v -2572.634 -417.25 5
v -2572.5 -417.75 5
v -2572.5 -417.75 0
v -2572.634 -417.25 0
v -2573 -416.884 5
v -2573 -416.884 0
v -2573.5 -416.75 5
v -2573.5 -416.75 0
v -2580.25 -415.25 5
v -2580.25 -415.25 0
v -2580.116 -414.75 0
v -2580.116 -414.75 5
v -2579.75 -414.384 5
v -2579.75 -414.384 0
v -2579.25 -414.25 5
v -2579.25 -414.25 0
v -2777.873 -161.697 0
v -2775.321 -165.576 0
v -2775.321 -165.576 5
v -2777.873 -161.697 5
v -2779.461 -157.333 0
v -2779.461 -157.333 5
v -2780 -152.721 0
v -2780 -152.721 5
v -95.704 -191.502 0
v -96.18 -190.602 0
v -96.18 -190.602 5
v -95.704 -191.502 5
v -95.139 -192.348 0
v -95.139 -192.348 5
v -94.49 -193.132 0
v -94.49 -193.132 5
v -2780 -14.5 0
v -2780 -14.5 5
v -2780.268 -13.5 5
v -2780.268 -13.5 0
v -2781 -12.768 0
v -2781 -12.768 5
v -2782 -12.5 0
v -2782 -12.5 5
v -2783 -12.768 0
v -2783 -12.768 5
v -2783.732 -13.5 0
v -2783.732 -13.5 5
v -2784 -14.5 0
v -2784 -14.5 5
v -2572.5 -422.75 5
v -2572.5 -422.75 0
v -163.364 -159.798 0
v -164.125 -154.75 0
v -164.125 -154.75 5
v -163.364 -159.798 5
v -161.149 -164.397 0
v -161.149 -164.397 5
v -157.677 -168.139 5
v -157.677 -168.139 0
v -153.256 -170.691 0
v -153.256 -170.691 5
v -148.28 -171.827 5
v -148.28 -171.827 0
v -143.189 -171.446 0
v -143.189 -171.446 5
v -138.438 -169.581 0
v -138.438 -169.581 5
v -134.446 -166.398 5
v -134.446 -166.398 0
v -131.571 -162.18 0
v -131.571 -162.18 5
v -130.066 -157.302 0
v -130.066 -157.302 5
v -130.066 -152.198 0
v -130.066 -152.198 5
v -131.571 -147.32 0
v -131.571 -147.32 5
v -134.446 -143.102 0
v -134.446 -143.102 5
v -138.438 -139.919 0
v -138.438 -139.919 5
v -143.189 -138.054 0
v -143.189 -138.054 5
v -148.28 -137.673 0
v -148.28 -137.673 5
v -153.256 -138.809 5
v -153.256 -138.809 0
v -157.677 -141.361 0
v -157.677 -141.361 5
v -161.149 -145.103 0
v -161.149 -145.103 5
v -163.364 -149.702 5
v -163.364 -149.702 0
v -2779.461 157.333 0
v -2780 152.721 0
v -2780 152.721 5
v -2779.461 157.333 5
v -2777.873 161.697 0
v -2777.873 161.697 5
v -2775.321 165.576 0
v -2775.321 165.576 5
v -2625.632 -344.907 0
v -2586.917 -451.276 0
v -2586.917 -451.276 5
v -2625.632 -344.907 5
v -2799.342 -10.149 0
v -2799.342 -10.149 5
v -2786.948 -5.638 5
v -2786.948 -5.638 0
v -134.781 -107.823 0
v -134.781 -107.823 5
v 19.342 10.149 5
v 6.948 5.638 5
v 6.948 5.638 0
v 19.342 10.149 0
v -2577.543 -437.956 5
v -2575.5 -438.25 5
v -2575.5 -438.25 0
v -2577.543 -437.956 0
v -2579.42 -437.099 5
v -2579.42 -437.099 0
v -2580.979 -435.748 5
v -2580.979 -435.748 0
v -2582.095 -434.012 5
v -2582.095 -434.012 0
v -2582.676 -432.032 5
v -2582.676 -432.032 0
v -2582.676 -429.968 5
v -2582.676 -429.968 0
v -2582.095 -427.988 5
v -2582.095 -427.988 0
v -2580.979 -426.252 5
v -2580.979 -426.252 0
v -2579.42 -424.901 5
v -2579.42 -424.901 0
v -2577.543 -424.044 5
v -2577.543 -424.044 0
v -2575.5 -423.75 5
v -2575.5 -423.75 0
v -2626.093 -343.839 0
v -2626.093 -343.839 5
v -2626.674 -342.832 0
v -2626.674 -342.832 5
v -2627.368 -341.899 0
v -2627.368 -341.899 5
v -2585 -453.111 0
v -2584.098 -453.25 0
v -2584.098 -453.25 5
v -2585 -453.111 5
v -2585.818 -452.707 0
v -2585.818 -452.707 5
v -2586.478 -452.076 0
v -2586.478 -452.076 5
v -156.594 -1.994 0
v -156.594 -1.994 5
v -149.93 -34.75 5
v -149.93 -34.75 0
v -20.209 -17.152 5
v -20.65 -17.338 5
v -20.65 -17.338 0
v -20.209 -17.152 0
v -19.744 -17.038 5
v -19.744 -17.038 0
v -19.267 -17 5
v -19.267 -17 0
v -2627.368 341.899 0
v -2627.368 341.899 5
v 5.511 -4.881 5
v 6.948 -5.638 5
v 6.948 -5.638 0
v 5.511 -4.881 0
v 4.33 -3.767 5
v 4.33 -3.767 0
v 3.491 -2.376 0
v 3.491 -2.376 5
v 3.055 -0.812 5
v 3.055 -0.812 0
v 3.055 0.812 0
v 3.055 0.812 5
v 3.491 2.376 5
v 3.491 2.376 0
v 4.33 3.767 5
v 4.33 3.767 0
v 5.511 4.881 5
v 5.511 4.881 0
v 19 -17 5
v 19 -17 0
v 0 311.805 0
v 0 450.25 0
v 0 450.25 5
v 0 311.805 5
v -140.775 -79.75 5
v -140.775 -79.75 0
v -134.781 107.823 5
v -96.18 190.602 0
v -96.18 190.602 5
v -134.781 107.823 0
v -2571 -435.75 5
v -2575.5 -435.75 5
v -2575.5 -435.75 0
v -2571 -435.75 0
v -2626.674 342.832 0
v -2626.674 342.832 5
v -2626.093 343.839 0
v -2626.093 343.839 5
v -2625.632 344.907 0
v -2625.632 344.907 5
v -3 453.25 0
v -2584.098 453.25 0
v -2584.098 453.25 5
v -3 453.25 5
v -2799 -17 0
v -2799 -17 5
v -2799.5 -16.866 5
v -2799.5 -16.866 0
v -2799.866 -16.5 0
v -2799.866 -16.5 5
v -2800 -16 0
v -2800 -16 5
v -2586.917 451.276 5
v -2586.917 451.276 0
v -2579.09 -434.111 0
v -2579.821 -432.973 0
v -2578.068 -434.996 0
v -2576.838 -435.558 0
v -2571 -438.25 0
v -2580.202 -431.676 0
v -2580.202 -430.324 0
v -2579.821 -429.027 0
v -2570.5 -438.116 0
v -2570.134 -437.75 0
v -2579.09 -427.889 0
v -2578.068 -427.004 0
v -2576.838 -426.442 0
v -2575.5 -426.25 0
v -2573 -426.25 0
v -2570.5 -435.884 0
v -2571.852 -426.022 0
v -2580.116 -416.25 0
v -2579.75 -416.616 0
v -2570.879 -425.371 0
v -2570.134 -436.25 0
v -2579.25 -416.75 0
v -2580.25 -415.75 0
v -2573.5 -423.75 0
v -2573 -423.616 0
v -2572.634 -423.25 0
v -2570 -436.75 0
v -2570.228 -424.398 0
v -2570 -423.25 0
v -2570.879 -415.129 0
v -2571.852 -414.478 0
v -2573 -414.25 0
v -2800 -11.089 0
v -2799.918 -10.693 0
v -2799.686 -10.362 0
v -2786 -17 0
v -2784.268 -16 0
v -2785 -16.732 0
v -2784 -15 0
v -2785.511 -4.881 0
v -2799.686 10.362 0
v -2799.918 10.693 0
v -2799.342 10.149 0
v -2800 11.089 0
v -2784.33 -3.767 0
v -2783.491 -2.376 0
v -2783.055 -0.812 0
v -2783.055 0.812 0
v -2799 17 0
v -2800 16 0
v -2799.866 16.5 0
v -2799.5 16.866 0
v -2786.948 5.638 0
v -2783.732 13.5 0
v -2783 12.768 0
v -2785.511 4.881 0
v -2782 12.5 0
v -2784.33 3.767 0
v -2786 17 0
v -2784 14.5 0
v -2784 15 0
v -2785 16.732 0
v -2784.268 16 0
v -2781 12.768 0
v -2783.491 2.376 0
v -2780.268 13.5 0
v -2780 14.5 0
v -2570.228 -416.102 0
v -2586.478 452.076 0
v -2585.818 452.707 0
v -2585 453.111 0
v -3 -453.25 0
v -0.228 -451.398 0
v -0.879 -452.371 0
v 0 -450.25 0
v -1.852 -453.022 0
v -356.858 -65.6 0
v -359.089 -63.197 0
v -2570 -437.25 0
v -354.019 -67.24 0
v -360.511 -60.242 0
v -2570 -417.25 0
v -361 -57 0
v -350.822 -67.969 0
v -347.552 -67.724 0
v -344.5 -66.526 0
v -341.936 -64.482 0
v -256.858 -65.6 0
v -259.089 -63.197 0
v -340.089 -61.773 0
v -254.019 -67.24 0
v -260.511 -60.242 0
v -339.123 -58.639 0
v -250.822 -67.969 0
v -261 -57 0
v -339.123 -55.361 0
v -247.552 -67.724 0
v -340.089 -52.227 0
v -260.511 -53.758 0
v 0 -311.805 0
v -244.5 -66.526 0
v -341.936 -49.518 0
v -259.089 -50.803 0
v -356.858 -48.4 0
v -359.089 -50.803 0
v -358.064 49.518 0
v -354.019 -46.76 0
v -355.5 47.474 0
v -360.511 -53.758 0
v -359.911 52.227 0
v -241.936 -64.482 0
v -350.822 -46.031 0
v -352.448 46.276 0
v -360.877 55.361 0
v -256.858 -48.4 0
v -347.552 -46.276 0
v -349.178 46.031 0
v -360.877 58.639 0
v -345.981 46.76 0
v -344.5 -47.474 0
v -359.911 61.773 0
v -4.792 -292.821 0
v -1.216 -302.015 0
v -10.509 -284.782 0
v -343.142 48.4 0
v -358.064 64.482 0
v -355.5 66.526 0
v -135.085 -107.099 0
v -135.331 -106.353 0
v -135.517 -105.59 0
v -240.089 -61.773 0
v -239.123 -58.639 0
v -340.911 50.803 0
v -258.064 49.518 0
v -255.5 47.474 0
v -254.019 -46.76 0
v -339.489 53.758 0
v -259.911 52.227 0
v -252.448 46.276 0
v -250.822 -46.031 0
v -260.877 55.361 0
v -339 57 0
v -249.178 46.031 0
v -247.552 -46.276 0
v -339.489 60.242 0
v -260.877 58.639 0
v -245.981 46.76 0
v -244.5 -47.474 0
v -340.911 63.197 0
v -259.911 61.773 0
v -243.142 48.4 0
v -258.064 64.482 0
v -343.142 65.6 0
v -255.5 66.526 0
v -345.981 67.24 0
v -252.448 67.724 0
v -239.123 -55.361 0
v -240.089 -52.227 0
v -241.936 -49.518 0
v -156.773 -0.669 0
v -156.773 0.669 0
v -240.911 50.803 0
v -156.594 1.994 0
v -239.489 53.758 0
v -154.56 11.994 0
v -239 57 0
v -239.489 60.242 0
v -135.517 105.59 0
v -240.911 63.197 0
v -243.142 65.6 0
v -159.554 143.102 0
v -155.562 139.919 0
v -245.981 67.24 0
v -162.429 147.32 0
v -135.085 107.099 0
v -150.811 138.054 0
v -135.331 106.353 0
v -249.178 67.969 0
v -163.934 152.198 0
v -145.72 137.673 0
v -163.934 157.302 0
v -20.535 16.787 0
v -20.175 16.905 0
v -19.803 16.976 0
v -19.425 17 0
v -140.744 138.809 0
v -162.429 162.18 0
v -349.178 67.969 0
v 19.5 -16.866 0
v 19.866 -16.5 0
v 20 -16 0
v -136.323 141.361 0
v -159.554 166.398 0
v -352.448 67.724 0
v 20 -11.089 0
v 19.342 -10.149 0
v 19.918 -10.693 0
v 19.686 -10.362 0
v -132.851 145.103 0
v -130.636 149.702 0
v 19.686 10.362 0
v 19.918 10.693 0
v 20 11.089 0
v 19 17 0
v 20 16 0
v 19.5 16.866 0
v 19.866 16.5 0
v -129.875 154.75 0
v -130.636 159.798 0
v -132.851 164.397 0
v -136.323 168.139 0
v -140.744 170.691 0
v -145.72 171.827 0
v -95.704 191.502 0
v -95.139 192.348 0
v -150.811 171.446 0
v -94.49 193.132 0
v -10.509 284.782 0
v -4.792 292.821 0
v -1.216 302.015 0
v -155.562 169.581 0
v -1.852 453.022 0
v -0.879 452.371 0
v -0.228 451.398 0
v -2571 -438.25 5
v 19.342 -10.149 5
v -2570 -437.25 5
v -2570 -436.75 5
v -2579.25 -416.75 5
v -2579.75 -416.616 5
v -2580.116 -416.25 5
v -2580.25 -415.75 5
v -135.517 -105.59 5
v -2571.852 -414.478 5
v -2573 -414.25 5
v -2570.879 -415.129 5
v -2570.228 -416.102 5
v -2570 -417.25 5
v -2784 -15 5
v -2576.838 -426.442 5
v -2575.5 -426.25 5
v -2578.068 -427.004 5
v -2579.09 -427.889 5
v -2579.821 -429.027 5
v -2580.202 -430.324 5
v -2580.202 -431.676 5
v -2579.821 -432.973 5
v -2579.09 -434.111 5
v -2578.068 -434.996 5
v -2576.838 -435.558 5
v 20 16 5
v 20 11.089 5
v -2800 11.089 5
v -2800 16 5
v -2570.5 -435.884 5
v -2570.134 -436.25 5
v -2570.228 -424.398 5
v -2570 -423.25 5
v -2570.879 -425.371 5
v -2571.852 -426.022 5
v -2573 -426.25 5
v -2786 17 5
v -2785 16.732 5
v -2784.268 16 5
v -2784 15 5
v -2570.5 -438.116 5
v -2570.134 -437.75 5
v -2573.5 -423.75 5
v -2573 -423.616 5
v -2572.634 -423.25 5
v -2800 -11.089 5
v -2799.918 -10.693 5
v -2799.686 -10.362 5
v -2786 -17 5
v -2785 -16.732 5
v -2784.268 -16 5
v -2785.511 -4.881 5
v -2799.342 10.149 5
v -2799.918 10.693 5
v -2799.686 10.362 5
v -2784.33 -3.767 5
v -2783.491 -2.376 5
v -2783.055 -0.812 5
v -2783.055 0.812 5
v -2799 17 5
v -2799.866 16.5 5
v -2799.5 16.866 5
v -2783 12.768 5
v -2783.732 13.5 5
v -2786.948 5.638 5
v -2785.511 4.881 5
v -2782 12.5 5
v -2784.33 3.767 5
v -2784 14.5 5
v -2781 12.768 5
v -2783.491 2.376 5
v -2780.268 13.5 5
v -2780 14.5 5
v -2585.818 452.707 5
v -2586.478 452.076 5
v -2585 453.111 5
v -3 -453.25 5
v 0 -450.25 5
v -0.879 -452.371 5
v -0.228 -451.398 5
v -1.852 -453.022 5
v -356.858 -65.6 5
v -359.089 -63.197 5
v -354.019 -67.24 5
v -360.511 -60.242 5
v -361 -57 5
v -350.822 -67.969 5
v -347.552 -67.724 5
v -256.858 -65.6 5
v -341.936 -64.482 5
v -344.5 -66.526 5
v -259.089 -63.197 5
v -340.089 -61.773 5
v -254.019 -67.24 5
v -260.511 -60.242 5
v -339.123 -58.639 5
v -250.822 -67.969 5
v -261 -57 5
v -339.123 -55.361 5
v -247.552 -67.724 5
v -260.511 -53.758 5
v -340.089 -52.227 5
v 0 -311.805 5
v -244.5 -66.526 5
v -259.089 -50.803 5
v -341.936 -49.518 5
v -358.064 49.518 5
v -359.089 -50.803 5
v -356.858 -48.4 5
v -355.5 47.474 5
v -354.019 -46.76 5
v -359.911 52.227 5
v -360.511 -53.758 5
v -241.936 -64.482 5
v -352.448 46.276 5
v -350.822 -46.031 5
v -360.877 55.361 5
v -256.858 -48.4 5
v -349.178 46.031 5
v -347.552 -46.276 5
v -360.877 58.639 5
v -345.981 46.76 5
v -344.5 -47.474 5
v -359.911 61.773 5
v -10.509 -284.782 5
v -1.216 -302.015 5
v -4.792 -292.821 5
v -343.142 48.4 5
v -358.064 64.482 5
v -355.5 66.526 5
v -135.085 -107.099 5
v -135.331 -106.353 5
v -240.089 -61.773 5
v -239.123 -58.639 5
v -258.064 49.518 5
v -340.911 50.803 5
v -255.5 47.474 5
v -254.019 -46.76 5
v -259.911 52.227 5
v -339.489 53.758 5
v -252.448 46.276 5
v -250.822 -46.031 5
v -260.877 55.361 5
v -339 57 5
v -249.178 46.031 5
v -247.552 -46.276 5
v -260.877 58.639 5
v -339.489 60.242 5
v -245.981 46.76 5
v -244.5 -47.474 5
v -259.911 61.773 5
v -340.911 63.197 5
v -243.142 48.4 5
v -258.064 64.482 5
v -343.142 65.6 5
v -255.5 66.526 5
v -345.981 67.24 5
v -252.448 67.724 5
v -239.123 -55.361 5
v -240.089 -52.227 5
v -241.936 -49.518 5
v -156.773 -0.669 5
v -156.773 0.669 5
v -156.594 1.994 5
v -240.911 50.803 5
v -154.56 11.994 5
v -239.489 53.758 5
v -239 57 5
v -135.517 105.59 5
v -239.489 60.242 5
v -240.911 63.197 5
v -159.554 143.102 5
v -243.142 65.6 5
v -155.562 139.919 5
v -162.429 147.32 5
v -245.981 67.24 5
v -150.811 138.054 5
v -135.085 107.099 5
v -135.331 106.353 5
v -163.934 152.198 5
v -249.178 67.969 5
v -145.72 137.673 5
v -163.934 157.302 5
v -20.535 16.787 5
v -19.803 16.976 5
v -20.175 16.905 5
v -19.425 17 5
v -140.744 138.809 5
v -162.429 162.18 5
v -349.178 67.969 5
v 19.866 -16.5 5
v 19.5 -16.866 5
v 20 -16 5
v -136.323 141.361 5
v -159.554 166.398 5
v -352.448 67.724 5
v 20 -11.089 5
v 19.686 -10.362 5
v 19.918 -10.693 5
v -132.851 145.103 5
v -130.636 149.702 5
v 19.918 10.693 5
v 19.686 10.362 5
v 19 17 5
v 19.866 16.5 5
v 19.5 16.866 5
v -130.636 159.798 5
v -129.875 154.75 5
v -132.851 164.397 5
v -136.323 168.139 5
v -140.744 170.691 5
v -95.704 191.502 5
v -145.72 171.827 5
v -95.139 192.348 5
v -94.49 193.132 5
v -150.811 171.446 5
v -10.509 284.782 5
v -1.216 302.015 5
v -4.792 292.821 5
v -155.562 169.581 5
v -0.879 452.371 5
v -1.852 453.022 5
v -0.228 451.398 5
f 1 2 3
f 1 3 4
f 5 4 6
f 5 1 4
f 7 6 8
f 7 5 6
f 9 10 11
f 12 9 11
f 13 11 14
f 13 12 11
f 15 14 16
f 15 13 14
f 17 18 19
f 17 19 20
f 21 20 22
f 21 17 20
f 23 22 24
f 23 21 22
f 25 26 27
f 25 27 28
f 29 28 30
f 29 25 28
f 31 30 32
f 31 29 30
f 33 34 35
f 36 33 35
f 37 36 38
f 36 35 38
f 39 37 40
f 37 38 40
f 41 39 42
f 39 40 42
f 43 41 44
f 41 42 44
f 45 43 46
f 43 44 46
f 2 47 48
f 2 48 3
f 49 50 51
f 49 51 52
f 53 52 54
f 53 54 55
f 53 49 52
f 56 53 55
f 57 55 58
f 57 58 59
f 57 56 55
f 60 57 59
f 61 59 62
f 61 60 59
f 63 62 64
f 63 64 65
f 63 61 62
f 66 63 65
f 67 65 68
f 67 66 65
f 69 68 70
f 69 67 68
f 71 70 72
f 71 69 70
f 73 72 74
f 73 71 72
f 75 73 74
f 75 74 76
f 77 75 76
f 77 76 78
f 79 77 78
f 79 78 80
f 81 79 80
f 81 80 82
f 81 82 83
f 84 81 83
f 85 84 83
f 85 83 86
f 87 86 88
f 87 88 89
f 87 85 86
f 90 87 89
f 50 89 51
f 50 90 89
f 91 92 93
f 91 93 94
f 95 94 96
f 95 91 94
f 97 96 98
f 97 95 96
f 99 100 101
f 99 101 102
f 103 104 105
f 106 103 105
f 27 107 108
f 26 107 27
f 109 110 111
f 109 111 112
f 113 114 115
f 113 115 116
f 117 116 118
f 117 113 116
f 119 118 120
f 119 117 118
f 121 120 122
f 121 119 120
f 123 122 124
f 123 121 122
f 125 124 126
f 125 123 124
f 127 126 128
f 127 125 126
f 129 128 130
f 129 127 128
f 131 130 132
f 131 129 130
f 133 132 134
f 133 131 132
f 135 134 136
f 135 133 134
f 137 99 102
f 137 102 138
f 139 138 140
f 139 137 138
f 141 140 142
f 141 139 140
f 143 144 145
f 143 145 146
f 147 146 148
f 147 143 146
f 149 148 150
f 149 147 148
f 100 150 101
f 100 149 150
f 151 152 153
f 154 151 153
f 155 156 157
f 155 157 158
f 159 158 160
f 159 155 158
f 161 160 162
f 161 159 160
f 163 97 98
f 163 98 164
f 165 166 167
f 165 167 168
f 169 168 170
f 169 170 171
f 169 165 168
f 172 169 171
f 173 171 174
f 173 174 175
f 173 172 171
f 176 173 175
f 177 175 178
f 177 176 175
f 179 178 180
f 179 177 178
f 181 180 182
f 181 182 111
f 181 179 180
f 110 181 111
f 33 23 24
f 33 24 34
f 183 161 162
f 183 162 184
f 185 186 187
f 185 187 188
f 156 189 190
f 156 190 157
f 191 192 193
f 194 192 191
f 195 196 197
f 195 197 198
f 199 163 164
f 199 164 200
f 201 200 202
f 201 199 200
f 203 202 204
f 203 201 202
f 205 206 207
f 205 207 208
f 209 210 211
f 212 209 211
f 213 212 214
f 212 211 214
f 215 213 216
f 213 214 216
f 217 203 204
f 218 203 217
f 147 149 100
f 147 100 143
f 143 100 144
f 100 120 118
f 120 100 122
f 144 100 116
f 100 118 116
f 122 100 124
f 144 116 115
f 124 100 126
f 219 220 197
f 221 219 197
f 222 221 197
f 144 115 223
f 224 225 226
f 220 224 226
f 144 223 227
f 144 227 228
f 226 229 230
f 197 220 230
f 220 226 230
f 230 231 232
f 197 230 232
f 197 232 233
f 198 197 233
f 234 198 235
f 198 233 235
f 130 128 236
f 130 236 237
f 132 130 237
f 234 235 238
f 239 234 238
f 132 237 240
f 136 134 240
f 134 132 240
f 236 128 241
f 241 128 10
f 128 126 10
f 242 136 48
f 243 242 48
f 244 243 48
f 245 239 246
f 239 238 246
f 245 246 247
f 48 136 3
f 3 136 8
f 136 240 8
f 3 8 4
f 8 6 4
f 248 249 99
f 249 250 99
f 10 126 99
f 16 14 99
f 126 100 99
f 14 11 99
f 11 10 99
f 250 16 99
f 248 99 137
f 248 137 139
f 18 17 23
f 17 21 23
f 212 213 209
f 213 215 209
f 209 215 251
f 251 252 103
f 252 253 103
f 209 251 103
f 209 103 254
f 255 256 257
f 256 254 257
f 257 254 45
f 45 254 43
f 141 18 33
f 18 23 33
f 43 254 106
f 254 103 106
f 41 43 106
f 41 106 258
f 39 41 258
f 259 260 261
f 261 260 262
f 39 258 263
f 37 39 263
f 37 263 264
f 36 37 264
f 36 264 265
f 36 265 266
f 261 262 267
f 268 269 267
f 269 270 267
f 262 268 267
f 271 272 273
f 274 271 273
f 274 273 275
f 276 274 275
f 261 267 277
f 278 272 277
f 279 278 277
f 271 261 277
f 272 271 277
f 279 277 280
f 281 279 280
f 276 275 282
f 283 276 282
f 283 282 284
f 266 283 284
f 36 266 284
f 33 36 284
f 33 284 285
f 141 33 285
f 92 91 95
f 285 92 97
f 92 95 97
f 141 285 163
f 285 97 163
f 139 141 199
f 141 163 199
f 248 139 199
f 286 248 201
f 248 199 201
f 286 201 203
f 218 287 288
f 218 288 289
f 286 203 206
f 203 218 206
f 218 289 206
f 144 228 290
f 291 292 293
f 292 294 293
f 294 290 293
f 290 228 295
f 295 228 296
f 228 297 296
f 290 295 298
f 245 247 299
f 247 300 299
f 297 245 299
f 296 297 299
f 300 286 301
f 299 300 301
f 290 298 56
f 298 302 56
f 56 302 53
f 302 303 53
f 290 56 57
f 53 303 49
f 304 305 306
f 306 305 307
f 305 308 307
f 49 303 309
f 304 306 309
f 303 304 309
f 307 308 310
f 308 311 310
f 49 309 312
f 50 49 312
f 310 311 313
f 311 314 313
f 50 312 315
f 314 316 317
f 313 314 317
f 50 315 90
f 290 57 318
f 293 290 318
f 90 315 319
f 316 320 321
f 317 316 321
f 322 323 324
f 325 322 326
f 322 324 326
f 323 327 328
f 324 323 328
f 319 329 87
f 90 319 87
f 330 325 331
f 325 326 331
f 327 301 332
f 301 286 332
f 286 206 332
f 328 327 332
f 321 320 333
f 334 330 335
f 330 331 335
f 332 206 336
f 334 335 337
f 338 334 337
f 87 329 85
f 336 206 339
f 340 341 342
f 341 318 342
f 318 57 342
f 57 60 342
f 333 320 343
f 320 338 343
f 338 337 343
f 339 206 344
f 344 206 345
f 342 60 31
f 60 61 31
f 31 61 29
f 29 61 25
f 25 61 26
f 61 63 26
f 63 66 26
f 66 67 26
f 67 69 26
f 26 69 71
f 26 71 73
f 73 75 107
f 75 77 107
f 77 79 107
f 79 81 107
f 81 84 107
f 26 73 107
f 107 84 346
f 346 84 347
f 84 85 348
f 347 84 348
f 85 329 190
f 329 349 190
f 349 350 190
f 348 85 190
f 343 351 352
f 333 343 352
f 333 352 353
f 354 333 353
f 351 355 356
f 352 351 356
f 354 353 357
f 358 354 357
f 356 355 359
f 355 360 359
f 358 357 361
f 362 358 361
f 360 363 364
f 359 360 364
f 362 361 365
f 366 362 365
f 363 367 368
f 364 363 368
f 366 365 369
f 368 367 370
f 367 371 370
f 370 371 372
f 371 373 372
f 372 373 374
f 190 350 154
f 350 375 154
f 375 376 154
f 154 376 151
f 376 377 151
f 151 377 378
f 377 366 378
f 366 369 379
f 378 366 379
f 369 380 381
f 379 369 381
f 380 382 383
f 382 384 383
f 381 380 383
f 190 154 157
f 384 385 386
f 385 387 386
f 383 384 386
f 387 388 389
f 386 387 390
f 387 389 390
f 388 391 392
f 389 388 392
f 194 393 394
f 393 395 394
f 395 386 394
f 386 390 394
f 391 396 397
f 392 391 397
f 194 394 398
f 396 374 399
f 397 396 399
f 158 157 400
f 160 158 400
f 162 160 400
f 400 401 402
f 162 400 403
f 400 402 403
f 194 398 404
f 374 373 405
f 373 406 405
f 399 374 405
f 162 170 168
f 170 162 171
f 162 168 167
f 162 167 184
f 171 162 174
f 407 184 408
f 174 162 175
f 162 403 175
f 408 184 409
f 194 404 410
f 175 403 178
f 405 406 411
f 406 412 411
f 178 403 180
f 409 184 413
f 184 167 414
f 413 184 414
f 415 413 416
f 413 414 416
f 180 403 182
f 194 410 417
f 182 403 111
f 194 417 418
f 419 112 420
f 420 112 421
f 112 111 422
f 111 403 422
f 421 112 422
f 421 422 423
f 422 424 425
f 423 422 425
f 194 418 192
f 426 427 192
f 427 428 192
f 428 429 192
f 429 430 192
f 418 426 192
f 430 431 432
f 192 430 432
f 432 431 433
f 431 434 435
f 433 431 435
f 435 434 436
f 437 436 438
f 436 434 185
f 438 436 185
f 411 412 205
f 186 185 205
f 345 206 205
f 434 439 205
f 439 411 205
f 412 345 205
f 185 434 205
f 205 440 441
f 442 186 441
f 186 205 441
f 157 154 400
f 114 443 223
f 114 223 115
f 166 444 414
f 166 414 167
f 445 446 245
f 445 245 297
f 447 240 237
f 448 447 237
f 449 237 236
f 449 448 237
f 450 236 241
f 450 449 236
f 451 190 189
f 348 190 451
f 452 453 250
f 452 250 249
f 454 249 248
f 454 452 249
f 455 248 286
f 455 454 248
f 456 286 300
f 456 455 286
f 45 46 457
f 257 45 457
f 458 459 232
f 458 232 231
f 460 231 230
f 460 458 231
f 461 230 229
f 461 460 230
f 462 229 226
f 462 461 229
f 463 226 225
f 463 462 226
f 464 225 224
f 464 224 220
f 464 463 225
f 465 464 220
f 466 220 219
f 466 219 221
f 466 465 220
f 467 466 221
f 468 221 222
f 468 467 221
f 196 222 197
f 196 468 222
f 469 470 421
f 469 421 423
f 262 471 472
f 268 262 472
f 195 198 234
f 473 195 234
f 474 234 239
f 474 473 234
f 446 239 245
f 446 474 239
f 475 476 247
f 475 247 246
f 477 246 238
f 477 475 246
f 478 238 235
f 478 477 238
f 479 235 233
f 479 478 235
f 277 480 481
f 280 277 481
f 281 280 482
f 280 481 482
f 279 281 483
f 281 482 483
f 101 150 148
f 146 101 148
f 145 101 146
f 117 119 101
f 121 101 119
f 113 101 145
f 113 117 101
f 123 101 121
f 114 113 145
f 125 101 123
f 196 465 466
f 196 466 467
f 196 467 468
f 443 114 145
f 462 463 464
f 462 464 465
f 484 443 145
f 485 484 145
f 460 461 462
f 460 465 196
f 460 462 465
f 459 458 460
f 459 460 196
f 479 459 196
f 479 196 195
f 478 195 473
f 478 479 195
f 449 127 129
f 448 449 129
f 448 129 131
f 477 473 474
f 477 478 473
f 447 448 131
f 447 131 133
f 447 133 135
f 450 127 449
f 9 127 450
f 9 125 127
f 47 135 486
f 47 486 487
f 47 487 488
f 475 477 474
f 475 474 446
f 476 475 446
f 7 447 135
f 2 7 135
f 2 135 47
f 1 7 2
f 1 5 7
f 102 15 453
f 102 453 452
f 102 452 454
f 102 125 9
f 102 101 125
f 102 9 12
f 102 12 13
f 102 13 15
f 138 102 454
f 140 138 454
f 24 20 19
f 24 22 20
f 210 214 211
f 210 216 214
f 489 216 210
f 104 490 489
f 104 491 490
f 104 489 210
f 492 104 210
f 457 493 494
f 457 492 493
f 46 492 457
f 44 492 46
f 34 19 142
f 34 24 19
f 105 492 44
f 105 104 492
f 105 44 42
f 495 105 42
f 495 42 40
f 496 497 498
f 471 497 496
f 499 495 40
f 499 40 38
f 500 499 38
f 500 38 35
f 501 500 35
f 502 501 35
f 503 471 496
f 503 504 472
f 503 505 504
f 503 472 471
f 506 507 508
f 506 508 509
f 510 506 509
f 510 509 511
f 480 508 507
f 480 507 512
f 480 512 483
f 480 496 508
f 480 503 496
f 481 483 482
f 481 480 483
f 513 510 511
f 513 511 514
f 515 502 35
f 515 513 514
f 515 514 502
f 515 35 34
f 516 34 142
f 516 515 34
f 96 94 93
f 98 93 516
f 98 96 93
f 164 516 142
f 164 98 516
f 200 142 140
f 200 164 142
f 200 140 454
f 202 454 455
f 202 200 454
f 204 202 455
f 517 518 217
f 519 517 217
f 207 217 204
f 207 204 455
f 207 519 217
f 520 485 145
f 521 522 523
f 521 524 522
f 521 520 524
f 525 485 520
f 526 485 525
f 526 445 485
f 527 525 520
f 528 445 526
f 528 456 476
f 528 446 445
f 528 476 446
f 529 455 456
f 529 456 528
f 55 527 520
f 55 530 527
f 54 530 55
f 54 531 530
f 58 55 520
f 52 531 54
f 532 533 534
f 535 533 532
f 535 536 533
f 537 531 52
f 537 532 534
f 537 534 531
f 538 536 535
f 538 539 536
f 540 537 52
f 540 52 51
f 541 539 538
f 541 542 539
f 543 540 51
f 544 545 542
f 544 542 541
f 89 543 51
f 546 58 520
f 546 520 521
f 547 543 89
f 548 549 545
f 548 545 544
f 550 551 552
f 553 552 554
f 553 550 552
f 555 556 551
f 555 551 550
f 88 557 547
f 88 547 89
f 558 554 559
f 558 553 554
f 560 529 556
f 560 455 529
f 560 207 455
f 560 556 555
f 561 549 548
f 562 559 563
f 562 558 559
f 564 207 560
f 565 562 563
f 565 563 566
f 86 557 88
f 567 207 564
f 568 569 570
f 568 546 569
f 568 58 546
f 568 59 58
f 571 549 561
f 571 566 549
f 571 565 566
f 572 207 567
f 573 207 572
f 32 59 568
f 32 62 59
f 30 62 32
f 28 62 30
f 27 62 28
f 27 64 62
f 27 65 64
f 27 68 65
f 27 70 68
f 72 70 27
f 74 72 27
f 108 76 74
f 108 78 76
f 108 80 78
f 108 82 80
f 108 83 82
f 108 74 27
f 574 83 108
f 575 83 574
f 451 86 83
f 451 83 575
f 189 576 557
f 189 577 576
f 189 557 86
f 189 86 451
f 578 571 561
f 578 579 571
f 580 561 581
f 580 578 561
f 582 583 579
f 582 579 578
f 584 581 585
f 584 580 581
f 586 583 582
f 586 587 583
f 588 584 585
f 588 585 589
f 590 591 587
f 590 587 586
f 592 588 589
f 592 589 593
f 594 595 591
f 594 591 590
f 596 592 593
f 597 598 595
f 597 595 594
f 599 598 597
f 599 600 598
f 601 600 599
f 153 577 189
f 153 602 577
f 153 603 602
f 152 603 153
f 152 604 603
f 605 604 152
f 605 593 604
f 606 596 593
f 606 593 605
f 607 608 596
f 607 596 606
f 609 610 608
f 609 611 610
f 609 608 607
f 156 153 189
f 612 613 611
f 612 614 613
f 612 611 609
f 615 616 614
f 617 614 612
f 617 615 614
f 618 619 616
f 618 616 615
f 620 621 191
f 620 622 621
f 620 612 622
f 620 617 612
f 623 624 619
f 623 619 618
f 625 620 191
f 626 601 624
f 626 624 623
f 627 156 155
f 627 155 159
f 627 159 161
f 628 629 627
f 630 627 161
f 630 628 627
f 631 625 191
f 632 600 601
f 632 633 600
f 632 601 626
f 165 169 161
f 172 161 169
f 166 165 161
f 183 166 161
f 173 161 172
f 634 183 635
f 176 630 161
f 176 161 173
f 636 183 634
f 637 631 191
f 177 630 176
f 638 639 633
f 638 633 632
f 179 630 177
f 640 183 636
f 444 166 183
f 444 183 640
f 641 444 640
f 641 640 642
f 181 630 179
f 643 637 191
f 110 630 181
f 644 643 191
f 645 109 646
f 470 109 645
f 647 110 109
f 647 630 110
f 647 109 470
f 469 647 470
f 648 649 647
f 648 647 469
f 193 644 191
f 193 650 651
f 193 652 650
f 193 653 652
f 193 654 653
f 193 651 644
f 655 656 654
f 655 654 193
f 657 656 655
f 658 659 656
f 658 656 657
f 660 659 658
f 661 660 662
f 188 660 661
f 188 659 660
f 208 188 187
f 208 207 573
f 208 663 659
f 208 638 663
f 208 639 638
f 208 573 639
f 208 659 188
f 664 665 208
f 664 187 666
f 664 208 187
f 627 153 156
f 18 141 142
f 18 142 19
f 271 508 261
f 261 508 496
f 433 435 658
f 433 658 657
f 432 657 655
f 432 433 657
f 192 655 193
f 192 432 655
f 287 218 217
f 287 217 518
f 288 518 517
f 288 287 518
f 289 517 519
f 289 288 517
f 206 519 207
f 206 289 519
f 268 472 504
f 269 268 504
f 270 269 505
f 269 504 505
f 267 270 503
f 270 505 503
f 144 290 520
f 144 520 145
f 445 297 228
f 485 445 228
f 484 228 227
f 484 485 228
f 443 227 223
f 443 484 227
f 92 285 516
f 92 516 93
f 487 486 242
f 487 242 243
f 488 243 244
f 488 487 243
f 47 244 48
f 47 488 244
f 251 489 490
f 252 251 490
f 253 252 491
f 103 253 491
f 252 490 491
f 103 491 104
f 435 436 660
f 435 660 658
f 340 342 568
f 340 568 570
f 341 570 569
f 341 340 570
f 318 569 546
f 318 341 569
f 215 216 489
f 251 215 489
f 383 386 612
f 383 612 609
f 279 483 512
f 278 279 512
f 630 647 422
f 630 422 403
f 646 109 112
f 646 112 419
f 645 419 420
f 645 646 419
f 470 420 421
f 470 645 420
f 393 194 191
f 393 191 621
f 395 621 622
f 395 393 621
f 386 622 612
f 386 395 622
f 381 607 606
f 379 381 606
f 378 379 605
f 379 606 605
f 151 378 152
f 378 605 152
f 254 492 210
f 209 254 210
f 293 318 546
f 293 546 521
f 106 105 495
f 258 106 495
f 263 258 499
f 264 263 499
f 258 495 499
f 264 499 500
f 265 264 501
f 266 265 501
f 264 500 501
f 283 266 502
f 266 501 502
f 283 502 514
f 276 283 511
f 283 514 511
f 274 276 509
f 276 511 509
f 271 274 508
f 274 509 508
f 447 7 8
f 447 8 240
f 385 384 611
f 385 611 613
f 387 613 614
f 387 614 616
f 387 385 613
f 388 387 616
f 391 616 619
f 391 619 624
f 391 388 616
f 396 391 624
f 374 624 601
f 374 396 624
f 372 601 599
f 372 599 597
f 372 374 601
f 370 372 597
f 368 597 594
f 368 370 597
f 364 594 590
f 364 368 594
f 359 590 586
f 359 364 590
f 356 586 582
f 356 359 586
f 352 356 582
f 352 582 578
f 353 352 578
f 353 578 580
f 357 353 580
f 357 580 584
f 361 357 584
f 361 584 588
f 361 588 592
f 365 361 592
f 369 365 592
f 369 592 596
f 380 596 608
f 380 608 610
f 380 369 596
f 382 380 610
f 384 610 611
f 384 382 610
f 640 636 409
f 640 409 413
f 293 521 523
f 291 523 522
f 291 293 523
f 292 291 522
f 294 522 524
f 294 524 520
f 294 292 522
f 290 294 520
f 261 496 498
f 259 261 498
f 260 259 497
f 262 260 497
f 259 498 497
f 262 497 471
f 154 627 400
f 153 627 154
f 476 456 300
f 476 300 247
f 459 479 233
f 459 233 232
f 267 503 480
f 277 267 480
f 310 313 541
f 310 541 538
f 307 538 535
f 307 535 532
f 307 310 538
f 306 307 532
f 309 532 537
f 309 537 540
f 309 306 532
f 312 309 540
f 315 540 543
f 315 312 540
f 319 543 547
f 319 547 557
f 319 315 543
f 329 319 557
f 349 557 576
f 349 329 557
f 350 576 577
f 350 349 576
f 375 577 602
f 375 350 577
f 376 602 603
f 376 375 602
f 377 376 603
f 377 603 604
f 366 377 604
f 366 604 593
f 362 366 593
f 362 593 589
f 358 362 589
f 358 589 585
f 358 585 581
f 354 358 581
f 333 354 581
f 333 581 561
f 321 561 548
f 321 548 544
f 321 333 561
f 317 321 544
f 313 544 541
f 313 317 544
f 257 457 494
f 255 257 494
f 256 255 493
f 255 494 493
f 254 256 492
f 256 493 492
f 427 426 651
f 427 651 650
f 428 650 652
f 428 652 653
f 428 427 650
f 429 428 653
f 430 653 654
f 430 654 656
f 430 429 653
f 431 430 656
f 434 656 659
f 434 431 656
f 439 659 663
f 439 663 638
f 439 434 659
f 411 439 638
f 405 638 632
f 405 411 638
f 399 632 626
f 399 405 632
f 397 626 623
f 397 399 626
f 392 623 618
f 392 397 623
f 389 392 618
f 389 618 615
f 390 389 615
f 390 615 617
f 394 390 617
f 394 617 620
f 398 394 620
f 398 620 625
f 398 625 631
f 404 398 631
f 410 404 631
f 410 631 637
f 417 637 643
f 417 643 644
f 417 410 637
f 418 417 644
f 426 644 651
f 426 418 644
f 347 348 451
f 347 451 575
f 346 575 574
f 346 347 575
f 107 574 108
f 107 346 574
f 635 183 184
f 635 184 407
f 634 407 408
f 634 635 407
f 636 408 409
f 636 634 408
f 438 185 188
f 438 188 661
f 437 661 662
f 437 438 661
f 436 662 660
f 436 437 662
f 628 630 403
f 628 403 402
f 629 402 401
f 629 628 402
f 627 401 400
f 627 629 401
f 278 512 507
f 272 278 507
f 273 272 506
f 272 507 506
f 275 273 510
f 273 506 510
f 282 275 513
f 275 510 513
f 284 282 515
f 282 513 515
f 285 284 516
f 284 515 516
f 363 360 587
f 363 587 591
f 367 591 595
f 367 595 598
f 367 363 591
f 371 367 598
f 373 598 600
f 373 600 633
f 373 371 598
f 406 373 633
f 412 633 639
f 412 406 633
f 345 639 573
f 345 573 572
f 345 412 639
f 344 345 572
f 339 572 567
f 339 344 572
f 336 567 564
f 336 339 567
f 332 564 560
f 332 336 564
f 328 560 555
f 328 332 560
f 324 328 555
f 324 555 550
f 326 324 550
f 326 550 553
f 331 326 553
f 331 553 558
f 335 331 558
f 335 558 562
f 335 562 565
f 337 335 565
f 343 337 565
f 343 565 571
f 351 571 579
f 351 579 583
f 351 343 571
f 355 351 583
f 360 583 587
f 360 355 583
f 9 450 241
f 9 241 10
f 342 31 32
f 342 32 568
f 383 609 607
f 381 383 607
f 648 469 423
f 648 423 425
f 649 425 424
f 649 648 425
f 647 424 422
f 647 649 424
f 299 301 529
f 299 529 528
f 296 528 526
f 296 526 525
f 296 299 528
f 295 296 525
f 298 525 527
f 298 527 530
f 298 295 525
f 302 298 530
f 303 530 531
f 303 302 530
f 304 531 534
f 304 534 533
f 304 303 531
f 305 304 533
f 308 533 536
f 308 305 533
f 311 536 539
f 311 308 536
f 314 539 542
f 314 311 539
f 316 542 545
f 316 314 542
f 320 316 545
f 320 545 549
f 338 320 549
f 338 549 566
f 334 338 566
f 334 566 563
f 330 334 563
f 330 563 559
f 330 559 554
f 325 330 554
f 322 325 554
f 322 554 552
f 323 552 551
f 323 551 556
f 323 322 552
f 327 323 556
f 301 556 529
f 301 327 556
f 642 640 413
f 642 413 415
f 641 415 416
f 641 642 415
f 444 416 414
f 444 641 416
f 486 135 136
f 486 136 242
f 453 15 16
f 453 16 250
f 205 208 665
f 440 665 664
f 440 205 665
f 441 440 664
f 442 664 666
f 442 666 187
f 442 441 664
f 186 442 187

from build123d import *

# Parameters (mm, degrees)
SKETCH1_R                      = 17.125
SKETCH1_R_2                    = 11
BASE_EXTRUDE_DEPTH             = 5
SK_RET_5_TAL_DEPTH             = 2837.452108268
SKETCH2_OUTSIDE_W              = 3414.424
SKETCH2_OUTSIDE_H              = 1500.924
BORTSK_RING_AF_BUKKESTOP_DEPTH = 5
BUKKESTOP_FARINA_DEPTH         = 5


with BuildPart() as part:
    # Sketch1 → Base-Extrude (new body)
    with BuildSketch(Plane.XY):
        with BuildLine():
            Line((0, 450.25), (0, 311.805149274))
            ThreePointArc((0, 311.805149274), (-2.719685229, 297.307627743), (-10.508906528, 284.781540969))
            Line((-10.508906528, 284.781540969), (-94.490164622, 193.132080081))
            ThreePointArc((-94.490164622, 193.132080081), (-95.432087377, 191.931880335), (-96.180469124, 190.602360622))
            Line((-96.180469124, 190.602360622), (-134.781265361, 107.822685955))
            ThreePointArc((-134.781265361, 107.822685955), (-135.215178753, 106.728141402), (-135.517434537, 105.590182681))
            Line((-135.517434537, 105.590182681), (-154.559858359, 11.993679344))
            ThreePointArc((-154.559858359, 11.993679344), (-152.504537753, 3.672946714), (-144.760611313, 0))
            Line((-144.760611313, 0), (17, 0))
            ThreePointArc((17, 0), (19.121320344, -0.878679656), (20, -3))
            Line((20, -3), (20, -17.334351162))
            ThreePointArc((20, -17.334351162), (19.242605724, -19.327017609), (17.352853621, -20.313527948))
            Line((17.352853621, -20.313527948), (-148.861908023, -40))
            Line((-148.861908023, -40), (-135.517434537, -105.590182681))
            ThreePointArc((-135.517434537, -105.590182681), (-135.215178753, -106.728141402), (-134.781265361, -107.822685955))
            Line((-134.781265361, -107.822685955), (-96.180469124, -190.602360622))
            ThreePointArc((-96.180469124, -190.602360622), (-95.432087377, -191.931880335), (-94.490164622, -193.132080081))
            Line((-94.490164622, -193.132080081), (-10.508906528, -284.781540969))
            ThreePointArc((-10.508906528, -284.781540969), (-2.719685229, -297.307627743), (0, -311.805149274))
            Line((0, -311.805149274), (0, -450.25))
            ThreePointArc((0, -450.25), (-0.878679656, -452.371320344), (-3, -453.25))
            Line((-3, -453.25), (-2584.097644203, -453.25))
            ThreePointArc((-2584.097644203, -453.25), (-2585.818373512, -452.707456133), (-2586.916722065, -451.27606043))
            Line((-2586.916722065, -451.27606043), (-2625.631918795, -344.906931626))
            ThreePointArc((-2625.631918795, -344.906931626), (-2626.368590965, -343.327133059), (-2627.368400571, -341.899256963))
            Line((-2627.368400571, -341.899256963), (-2775.320888862, -165.576347508))
            ThreePointArc((-2775.320888862, -165.576347508), (-2778.793852416, -159.560998181), (-2780, -152.720595315))
            Line((-2780, -152.720595315), (-2780, -22.342329219))
            ThreePointArc((-2780, -22.342329219), (-2780.635383686, -20.496092591), (-2782.272393125, -19.431901719))
            Line((-2782.272393125, -19.431901719), (-2797.727606875, -15.568098281))
            ThreePointArc((-2797.727606875, -15.568098281), (-2799.364616314, -14.503907409), (-2800, -12.657670781))
            Line((-2800, -12.657670781), (-2800, -3))
            ThreePointArc((-2800, -3), (-2799.121320344, -0.878679656), (-2797, 0))
            Line((-2797, 0), (-2792.062257748, 0))
            ThreePointArc((-2792.062257748, 0), (-2789.427026365, -0.750817072), (-2787.583225666, -2.777777778))
            ThreePointArc((-2787.583225666, -2.777777778), (-2783.087011135, -4.894412835), (-2780, -1))
            Line((-2780, -1), (-2780, 0))
            Line((-2780, 0), (-2780, 152.720595315))
            ThreePointArc((-2780, 152.720595315), (-2778.793852416, 159.560998181), (-2775.320888862, 165.576347508))
            Line((-2775.320888862, 165.576347508), (-2627.368400571, 341.899256963))
            ThreePointArc((-2627.368400571, 341.899256963), (-2626.368590965, 343.327133059), (-2625.631918795, 344.906931626))
            Line((-2625.631918795, 344.906931626), (-2586.916722065, 451.27606043))
            ThreePointArc((-2586.916722065, 451.27606043), (-2585.818373512, 452.707456133), (-2584.097644203, 453.25))
            Line((-2584.097644203, 453.25), (-3, 453.25))
            ThreePointArc((-3, 453.25), (-0.878679656, 452.371320344), (0, 450.25))
        make_face()
        with Locations((-147, 154.75)):
            Circle(SKETCH1_R, mode=Mode.SUBTRACT)
        with Locations(Location((-147, -154.75, 0), (0, 0, 180))):
            Circle(SKETCH1_R, mode=Mode.SUBTRACT)
        with Locations((-250, 57)):
            Circle(SKETCH1_R_2, mode=Mode.SUBTRACT)
        with Locations((-350, 57)):
            Circle(SKETCH1_R_2, mode=Mode.SUBTRACT)
        with Locations(Location((-250, -57, 0), (0, 0, 180))):
            Circle(SKETCH1_R_2, mode=Mode.SUBTRACT)
        with Locations(Location((-350, -57, 0), (0, 0, 180))):
            Circle(SKETCH1_R_2, mode=Mode.SUBTRACT)
    extrude(amount=BASE_EXTRUDE_DEPTH)

    # Sketch5 → Skåret 5 tal (cut, through all)
    with BuildSketch(Plane.XY.offset(5)):
        with BuildLine():
            Line((-2579.25, -414.25), (-2573, -414.25))
            ThreePointArc((-2573, -414.25), (-2570.878679656, -415.128679656), (-2570, -417.25))
            Line((-2570, -417.25), (-2570, -423.25))
            ThreePointArc((-2570, -423.25), (-2570.878679656, -425.371320344), (-2573, -426.25))
            Line((-2573, -426.25), (-2575.5, -426.25))
            ThreePointArc((-2575.5, -426.25), (-2580.25, -431), (-2575.5, -435.75))
            Line((-2575.5, -435.75), (-2571, -435.75))
            ThreePointArc((-2571, -435.75), (-2570.292893219, -436.042893219), (-2570, -436.75))
            Line((-2570, -436.75), (-2570, -437.25))
            ThreePointArc((-2570, -437.25), (-2570.292893219, -437.957106781), (-2571, -438.25))
            Line((-2571, -438.25), (-2575.5, -438.25))
            ThreePointArc((-2575.5, -438.25), (-2582.75, -431), (-2575.5, -423.75))
            Line((-2575.5, -423.75), (-2573.5, -423.75))
            ThreePointArc((-2573.5, -423.75), (-2572.792893219, -423.457106781), (-2572.5, -422.75))
            Line((-2572.5, -422.75), (-2572.5, -417.75))
            ThreePointArc((-2572.5, -417.75), (-2572.792893219, -417.042893219), (-2573.5, -416.75))
            Line((-2573.5, -416.75), (-2579.25, -416.75))
            ThreePointArc((-2579.25, -416.75), (-2579.957106781, -416.457106781), (-2580.25, -415.75))
            Line((-2580.25, -415.75), (-2580.25, -415.25))
            ThreePointArc((-2580.25, -415.25), (-2579.957106781, -414.542893219), (-2579.25, -414.25))
        make_face()
    extrude(amount=-SK_RET_5_TAL_DEPTH, mode=Mode.SUBTRACT)

    # Sketch2 outside → Bortskæring af bukkestop (cut)
    with BuildSketch(Plane.XY.offset(5)):
        with Locations((-1390, 0)):
            Rectangle(SKETCH2_OUTSIDE_W, SKETCH2_OUTSIDE_H)
        with BuildLine():
            Line((0, -453.25), (-2780, -453.25))
            Line((-2780, -453.25), (-2780, 453.25))
            Line((-2780, 453.25), (0, 453.25))
            Line((0, 453.25), (0, 58.791931013))
            Line((0, 58.791931013), (-145.038646448, 58.791931013))
            Line((-145.038646448, 58.791931013), (-156.594381353, 1.993679344))
            ThreePointArc((-156.594381353, 1.993679344), (-156.795134307, 0), (-156.594381353, -1.993679344))
            Line((-156.594381353, -1.993679344), (-145.038646448, -58.791931013))
            Line((-145.038646448, -58.791931013), (0, -58.791931013))
            Line((0, -58.791931013), (0, -453.25))
        make_face(mode=Mode.SUBTRACT)
    extrude(amount=-BORTSK_RING_AF_BUKKESTOP_DEPTH, mode=Mode.SUBTRACT)

    # Sketch6 → Bukkestop - Farina (add)
    with BuildSketch(Plane.XY.offset(5)):
        with BuildLine():
            Line((-2786.94787914, 5.638155725), (-2799.342020143, 10.149254129))
            ThreePointArc((-2799.342020143, 10.149254129), (-2799.819152044, 10.515370314), (-2800, 11.08894675))
            Line((-2800, 11.08894675), (-2800, 16))
            ThreePointArc((-2800, 16), (-2799.707106781, 16.707106781), (-2799, 17))
            Line((-2799, 17), (-2786, 17))
            ThreePointArc((-2786, 17), (-2784.585786438, 16.414213562), (-2784, 15))
            Line((-2784, 15), (-2784, 14.5))
            ThreePointArc((-2784, 14.5), (-2782, 12.5), (-2780, 14.5))
            Line((-2780, 14.5), (-2780, -14.5))
            ThreePointArc((-2780, -14.5), (-2782, -12.5), (-2784, -14.5))
            Line((-2784, -14.5), (-2784, -15))
            ThreePointArc((-2784, -15), (-2784.585786438, -16.414213562), (-2786, -17))
            Line((-2786, -17), (-2799, -17))
            ThreePointArc((-2799, -17), (-2799.707106781, -16.707106781), (-2800, -16))
            Line((-2800, -16), (-2800, -11.08894675))
            ThreePointArc((-2800, -11.08894675), (-2799.819152044, -10.515370314), (-2799.342020143, -10.149254129))
            Line((-2799.342020143, -10.149254129), (-2786.94787914, -5.638155725))
            ThreePointArc((-2786.94787914, -5.638155725), (-2783, 0), (-2786.94787914, 5.638155725))
        make_face()
        with BuildLine():
            Line((6.94787914, 5.638155725), (19.342020143, 10.149254129))
            ThreePointArc((19.342020143, 10.149254129), (19.819152044, 10.515370314), (20, 11.08894675))
            Line((20, 11.08894675), (20, 16))
            ThreePointArc((20, 16), (19.707106781, 16.707106781), (19, 17))
            Line((19, 17), (-19.424545303, 17))
            ThreePointArc((-19.424545303, 17), (-19.989696761, 16.946286447), (-20.534610691, 16.787069219))
            Line((-20.534610691, 16.787069219), (-149.930032595, -34.75))
            Line((-149.930032595, -34.75), (-140.774679121, -79.75))
            Line((-140.774679121, -79.75), (-20.650302992, -17.337873079))
            ThreePointArc((-20.650302992, -17.337873079), (-19.979067171, -17.085692127), (-19.267161546, -17))
            Line((-19.267161546, -17), (19, -17))
            ThreePointArc((19, -17), (19.707106781, -16.707106781), (20, -16))
            Line((20, -16), (20, -11.08894675))
            ThreePointArc((20, -11.08894675), (19.819152044, -10.515370314), (19.342020143, -10.149254129))
            Line((19.342020143, -10.149254129), (6.94787914, -5.638155725))
            ThreePointArc((6.94787914, -5.638155725), (3, 0), (6.94787914, 5.638155725))
        make_face()
    extrude(amount=-BUKKESTOP_FARINA_DEPTH)


solid = part.part
